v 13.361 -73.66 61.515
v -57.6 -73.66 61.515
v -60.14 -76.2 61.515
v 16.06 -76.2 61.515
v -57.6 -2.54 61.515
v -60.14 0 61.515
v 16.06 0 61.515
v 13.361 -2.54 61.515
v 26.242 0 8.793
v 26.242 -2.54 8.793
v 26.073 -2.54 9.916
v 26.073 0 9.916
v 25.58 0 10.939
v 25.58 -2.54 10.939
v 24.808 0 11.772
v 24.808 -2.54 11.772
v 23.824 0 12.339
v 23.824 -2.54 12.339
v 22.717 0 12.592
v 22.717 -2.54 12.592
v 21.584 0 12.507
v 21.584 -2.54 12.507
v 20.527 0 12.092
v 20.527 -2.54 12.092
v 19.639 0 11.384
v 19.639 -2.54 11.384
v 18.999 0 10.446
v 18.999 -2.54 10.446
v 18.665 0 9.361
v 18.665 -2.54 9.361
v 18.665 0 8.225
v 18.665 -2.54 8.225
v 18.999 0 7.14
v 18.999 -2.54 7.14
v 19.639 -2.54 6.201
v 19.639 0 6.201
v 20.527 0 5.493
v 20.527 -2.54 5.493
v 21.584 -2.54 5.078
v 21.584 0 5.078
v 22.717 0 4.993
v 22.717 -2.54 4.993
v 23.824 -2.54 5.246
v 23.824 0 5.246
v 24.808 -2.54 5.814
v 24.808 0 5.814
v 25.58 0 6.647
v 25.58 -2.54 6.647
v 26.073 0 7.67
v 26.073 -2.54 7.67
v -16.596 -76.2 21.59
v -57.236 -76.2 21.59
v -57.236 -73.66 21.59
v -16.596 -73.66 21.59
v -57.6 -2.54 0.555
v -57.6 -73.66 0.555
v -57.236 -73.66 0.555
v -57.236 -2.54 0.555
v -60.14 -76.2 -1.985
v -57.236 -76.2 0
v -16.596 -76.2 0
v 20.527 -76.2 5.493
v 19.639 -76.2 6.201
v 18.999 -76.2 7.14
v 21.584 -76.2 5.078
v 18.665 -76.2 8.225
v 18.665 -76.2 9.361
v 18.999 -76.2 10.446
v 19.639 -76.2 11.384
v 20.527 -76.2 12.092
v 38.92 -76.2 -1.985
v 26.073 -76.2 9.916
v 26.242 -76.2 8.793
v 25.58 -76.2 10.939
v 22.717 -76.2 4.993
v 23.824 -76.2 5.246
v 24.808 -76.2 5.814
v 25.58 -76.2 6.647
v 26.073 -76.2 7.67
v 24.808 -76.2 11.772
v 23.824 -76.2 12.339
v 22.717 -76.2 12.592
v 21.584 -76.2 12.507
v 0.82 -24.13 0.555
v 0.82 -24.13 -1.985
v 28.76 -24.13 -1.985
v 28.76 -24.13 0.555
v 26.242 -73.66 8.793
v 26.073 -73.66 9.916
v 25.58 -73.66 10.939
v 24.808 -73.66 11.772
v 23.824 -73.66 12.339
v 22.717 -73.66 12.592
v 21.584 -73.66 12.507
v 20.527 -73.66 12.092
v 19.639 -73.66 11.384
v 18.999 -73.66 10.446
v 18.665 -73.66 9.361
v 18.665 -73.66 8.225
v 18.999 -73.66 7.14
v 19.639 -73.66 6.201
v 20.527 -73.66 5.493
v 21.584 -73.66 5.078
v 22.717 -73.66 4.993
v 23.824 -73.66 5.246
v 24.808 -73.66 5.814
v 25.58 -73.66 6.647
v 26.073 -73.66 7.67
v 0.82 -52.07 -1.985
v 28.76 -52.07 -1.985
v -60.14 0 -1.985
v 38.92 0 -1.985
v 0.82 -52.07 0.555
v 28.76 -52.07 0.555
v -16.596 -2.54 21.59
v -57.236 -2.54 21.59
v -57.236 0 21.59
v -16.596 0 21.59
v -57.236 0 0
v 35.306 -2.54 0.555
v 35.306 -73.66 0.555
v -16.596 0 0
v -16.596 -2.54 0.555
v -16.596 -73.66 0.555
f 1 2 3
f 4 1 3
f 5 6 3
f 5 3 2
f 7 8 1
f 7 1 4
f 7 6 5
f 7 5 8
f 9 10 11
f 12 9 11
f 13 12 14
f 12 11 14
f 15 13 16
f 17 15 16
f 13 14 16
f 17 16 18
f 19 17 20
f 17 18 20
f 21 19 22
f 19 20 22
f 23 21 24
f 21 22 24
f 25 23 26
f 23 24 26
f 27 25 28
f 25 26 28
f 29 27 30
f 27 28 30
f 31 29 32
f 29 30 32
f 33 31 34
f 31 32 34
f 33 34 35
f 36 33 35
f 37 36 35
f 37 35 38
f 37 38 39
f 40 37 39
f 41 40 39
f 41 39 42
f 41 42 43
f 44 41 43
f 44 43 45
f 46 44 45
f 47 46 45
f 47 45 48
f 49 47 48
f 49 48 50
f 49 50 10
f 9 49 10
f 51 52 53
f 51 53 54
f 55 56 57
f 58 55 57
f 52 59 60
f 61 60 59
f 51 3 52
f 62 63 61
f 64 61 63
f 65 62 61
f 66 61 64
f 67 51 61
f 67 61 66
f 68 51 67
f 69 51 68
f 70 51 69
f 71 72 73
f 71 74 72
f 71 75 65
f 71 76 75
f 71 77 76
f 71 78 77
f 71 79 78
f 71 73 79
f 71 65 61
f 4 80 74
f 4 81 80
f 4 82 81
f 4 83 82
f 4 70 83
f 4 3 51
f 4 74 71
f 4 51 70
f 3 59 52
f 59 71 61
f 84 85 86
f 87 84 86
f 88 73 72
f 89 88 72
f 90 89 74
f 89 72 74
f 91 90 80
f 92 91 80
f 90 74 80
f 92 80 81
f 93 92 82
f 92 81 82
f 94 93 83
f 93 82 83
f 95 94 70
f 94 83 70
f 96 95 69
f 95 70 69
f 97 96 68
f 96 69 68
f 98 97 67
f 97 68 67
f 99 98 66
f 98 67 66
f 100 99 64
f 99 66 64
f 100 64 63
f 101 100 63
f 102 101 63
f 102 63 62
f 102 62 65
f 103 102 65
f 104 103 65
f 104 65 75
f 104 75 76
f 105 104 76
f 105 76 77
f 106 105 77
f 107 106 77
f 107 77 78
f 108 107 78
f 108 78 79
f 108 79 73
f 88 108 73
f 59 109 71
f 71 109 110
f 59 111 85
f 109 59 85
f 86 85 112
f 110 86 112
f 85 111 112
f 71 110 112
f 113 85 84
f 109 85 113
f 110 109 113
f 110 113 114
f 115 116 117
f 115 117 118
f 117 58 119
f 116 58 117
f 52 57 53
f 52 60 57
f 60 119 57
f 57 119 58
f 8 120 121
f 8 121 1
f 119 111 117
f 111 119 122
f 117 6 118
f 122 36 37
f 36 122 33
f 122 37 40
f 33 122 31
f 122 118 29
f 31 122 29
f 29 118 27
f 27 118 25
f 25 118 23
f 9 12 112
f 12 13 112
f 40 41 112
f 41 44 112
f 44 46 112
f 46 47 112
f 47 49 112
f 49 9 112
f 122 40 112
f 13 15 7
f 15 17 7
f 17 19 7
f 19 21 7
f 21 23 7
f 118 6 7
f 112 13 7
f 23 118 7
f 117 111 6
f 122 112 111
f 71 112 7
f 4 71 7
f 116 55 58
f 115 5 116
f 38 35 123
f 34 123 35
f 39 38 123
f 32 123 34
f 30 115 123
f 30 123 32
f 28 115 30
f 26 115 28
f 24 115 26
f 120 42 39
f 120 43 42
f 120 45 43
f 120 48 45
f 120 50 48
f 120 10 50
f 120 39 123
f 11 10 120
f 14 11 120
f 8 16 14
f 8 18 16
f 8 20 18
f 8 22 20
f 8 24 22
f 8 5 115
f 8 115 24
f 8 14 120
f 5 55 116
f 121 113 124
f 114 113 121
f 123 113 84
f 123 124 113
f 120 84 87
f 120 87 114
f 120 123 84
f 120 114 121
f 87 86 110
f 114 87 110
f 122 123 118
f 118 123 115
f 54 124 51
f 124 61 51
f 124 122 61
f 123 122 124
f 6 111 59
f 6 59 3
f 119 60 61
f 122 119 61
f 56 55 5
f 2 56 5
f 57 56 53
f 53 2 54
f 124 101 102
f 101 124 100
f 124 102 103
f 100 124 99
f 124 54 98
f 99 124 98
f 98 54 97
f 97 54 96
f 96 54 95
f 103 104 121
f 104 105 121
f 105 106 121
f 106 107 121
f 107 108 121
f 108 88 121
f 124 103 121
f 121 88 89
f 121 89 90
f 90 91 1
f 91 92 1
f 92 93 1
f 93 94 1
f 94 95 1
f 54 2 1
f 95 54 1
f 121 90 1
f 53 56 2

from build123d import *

# Parameters (mm, degrees)
F0_W     = 76.2
F0_H     = 63.5
F1_DEPTH = 76.2
F2_T     = -2.54
F3_W     = 27.94
F3_H     = 27.94
F4_DEPTH = 16.256
F5_W     = 40.64
F5_H     = 21.59
F6_DEPTH = 100.076
F7_R     = 3.81
F8_DEPTH = 99.822


with BuildPart() as f1:
    # F0 (on Front) → F1 (new body)
    with BuildSketch(Plane.XZ):
        with Locations((-22.039793, 29.765201)):
            Rectangle(F0_W, F0_H)
        Polygon((38.920207, -1.984799), (16.060207, 61.515201), (16.060207, -1.984799), align=None)
    extrude(amount=F1_DEPTH)

    # F2
    f2_openings = [f1.faces().sort_by_distance(p)[0] for p in [
        (-22.039793, -38.1, 61.515201),
    ]]
    offset(amount=F2_T, openings=f2_openings)

    # F3 (on face) → F4 (cut)
    with BuildSketch(Plane(origin=(0, 0, -1.984799), x_dir=(1, 0, 0), z_dir=(0, 0, -1))):
        with Locations((14.790207, 38.1)):
            Rectangle(F3_W, F3_H)
    extrude(amount=-F4_DEPTH, mode=Mode.SUBTRACT)

    # F5 (on face) → F6 (cut)
    with BuildSketch(Plane.XZ.offset(76.2)):
        with Locations((-36.9158, 10.795)):
            Rectangle(F5_W, F5_H)
    extrude(amount=-F6_DEPTH, mode=Mode.SUBTRACT)

    # F7 (on face) → F8 (cut)
    with BuildSketch(Plane.XZ.offset(76.2)):
        with Locations((22.432121, 8.792778)):
            Circle(F7_R)
    extrude(amount=-F8_DEPTH, mode=Mode.SUBTRACT)


solid = f1.part
